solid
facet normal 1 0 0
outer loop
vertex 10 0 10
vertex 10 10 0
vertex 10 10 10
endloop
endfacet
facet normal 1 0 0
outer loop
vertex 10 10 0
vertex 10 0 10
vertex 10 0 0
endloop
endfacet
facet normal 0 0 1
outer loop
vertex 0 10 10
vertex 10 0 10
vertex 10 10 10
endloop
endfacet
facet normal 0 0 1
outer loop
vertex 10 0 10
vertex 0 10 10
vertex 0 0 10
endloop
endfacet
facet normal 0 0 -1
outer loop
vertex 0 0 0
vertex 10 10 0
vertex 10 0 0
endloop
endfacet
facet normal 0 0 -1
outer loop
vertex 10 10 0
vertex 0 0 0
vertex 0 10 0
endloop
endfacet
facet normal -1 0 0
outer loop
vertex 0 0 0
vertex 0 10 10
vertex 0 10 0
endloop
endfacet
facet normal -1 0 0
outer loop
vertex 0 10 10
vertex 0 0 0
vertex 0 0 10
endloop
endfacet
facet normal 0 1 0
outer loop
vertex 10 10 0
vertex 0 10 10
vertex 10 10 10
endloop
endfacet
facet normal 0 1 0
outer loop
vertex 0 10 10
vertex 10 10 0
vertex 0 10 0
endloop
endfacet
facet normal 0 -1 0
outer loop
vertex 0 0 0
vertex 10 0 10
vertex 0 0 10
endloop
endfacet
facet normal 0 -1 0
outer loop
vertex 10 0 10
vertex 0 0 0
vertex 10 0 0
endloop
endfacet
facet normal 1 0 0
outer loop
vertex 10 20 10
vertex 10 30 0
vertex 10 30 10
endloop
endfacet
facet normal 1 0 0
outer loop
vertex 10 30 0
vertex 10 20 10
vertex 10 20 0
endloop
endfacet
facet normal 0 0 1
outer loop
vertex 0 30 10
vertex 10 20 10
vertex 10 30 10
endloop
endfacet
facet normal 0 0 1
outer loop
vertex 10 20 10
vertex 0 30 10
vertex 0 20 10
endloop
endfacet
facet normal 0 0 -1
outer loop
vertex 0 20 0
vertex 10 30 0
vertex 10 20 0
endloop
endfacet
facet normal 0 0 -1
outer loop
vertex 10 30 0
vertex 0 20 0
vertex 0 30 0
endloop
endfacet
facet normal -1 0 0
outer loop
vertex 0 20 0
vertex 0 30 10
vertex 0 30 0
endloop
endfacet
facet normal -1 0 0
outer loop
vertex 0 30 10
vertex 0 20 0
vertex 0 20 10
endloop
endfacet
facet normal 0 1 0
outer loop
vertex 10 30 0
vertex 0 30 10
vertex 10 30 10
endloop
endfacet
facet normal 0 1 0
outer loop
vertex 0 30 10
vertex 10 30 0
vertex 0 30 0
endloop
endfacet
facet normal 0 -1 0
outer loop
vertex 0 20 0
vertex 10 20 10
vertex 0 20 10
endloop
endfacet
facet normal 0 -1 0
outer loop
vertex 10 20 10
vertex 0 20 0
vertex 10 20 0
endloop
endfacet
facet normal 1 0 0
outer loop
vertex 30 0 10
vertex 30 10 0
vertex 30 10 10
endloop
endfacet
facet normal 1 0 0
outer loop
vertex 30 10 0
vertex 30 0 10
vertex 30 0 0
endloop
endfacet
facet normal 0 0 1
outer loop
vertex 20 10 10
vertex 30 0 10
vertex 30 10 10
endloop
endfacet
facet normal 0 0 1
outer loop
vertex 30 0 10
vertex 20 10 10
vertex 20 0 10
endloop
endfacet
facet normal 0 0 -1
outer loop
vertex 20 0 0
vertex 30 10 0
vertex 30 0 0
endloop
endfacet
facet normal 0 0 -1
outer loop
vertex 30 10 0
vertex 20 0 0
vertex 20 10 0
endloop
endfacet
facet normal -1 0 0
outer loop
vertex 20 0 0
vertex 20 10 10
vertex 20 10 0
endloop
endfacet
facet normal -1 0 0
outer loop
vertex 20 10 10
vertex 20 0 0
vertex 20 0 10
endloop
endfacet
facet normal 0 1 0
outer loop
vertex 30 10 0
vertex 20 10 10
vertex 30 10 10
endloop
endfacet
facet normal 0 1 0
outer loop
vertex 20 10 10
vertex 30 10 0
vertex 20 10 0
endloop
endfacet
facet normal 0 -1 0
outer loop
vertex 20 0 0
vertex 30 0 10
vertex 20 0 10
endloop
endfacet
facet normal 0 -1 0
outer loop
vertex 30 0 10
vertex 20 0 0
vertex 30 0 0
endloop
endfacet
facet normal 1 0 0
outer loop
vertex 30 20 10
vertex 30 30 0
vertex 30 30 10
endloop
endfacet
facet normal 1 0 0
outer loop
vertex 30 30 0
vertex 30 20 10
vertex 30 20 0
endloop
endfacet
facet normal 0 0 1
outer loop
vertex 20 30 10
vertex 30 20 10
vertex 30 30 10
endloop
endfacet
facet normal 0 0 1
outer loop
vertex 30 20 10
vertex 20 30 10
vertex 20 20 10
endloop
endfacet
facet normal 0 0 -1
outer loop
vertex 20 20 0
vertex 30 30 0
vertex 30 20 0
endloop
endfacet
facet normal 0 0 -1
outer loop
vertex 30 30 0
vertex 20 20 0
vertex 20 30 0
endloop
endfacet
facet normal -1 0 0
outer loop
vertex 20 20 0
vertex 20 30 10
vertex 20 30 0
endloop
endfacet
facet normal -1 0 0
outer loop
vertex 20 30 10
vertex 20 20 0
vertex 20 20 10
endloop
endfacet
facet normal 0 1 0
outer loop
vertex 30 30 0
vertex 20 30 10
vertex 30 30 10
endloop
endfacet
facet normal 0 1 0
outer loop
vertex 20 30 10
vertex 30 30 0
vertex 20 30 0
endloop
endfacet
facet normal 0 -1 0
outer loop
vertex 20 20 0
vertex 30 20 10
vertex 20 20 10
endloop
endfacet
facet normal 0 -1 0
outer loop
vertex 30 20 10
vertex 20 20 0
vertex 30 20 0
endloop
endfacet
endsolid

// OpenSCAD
        for (i = [0, 20]){
            for (j = [0, 20]){
                translate([i, j, 0])
                    cube([10, 10, 10]);
            }
        }
